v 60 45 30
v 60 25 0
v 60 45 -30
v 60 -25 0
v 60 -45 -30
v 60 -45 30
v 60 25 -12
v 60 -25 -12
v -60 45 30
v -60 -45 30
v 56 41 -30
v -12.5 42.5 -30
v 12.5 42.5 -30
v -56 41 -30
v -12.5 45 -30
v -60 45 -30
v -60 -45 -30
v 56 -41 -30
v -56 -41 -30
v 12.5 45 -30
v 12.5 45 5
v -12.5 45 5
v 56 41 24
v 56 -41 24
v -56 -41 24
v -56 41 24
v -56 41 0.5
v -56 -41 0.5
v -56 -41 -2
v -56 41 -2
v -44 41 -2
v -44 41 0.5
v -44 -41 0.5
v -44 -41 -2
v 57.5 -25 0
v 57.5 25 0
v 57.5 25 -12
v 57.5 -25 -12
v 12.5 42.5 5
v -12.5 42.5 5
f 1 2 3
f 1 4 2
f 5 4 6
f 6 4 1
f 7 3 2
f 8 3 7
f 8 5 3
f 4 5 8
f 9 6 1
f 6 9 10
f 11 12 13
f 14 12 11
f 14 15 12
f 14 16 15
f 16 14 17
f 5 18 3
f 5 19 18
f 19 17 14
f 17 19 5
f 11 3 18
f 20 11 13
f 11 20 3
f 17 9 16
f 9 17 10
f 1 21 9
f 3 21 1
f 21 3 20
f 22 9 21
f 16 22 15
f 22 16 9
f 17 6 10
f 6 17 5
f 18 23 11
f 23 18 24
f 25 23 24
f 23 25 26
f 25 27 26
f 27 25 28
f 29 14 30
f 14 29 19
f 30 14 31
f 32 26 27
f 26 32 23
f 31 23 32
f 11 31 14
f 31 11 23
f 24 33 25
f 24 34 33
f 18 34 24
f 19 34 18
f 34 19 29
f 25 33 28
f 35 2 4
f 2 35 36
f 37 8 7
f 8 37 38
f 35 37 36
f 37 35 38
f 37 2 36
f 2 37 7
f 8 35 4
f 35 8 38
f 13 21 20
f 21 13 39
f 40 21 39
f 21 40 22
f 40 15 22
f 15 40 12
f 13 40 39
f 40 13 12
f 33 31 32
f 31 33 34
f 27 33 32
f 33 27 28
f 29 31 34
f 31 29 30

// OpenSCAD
// Global resolution setting
$fn = 64;

// ==============================
// Parametric Dimension Definitions
// ==============================
// Envelope Dimensions (mm)
outer_length = 120;   // X-axis size of enclosure
outer_width = 90;     // Y-axis size of enclosure
outer_height = 60;    // Z-axis total height of enclosure
wall_thickness = 4;   // Thickness of all exterior walls
rim_height = 6;       // Height of top rim surrounding the open top

// Horizontal Recess Parameters (on +X front face)
horiz_recess_width = 50;
horiz_recess_height = 12;
horiz_recess_bottom_gap = 18; // Distance from enclosure base to bottom of recess

// Vertical Opening Parameters (on +Y side face)
vert_opening_width = 25;
vert_opening_height = 35; // Total height, extends upward from enclosure base

// Internal Ledge Parameters (mounted on -X interior wall)
ledge_depth = 12;
ledge_thickness = 2.5;
ledge_top_height = 28; // Height of ledge top surface from enclosure base

// ==============================
// Module Definitions
// ==============================
// Generates hollow enclosure shell with top rim
module enclosure_shell() {
    difference() {
        // Full outer solid block
        cube([outer_length, outer_width, outer_height], center=true);
        
        // Remove internal cavity, leaving top rim intact
        translate([0, 0, -rim_height/2])
        cube([
            outer_length - 2*wall_thickness,
            outer_width - 2*wall_thickness,
            outer_height - rim_height
        ], center=true);
    }
}

// Generates all subtractive side cut geometry
module side_cut_features() {
    union() {
        // Horizontal recess on front (+X) face
        translate([
            outer_length/2,
            0,
            (-outer_height/2) + horiz_recess_bottom_gap + horiz_recess_height/2
        ])
        cube([wall_thickness + 1, horiz_recess_width, horiz_recess_height], center=true);
        
        // Vertical through opening on right (+Y) face
        translate([
            0,
            outer_width/2,
            (-outer_height/2) + vert_opening_height/2
        ])
        cube([vert_opening_width, wall_thickness + 1, vert_opening_height], center=true);
    }
}

// Generates internal shelf ledge mounted to rear interior wall
module internal_shelf_ledge() {
    translate([
        (-outer_length/2) + wall_thickness + ledge_depth/2,
        0,
        (-outer_height/2) + ledge_top_height + ledge_thickness/2
    ])
    cube([
        ledge_depth,
        outer_width - 2*wall_thickness,
        ledge_thickness
    ], center=true);
}

// ==============================
// Final Model Assembly
// ==============================
union() {
    // Base enclosure with side features subtracted
    difference() {
        enclosure_shell();
        side_cut_features();
    }
    
    // Add internal ledge feature
    internal_shelf_ledge();
}
